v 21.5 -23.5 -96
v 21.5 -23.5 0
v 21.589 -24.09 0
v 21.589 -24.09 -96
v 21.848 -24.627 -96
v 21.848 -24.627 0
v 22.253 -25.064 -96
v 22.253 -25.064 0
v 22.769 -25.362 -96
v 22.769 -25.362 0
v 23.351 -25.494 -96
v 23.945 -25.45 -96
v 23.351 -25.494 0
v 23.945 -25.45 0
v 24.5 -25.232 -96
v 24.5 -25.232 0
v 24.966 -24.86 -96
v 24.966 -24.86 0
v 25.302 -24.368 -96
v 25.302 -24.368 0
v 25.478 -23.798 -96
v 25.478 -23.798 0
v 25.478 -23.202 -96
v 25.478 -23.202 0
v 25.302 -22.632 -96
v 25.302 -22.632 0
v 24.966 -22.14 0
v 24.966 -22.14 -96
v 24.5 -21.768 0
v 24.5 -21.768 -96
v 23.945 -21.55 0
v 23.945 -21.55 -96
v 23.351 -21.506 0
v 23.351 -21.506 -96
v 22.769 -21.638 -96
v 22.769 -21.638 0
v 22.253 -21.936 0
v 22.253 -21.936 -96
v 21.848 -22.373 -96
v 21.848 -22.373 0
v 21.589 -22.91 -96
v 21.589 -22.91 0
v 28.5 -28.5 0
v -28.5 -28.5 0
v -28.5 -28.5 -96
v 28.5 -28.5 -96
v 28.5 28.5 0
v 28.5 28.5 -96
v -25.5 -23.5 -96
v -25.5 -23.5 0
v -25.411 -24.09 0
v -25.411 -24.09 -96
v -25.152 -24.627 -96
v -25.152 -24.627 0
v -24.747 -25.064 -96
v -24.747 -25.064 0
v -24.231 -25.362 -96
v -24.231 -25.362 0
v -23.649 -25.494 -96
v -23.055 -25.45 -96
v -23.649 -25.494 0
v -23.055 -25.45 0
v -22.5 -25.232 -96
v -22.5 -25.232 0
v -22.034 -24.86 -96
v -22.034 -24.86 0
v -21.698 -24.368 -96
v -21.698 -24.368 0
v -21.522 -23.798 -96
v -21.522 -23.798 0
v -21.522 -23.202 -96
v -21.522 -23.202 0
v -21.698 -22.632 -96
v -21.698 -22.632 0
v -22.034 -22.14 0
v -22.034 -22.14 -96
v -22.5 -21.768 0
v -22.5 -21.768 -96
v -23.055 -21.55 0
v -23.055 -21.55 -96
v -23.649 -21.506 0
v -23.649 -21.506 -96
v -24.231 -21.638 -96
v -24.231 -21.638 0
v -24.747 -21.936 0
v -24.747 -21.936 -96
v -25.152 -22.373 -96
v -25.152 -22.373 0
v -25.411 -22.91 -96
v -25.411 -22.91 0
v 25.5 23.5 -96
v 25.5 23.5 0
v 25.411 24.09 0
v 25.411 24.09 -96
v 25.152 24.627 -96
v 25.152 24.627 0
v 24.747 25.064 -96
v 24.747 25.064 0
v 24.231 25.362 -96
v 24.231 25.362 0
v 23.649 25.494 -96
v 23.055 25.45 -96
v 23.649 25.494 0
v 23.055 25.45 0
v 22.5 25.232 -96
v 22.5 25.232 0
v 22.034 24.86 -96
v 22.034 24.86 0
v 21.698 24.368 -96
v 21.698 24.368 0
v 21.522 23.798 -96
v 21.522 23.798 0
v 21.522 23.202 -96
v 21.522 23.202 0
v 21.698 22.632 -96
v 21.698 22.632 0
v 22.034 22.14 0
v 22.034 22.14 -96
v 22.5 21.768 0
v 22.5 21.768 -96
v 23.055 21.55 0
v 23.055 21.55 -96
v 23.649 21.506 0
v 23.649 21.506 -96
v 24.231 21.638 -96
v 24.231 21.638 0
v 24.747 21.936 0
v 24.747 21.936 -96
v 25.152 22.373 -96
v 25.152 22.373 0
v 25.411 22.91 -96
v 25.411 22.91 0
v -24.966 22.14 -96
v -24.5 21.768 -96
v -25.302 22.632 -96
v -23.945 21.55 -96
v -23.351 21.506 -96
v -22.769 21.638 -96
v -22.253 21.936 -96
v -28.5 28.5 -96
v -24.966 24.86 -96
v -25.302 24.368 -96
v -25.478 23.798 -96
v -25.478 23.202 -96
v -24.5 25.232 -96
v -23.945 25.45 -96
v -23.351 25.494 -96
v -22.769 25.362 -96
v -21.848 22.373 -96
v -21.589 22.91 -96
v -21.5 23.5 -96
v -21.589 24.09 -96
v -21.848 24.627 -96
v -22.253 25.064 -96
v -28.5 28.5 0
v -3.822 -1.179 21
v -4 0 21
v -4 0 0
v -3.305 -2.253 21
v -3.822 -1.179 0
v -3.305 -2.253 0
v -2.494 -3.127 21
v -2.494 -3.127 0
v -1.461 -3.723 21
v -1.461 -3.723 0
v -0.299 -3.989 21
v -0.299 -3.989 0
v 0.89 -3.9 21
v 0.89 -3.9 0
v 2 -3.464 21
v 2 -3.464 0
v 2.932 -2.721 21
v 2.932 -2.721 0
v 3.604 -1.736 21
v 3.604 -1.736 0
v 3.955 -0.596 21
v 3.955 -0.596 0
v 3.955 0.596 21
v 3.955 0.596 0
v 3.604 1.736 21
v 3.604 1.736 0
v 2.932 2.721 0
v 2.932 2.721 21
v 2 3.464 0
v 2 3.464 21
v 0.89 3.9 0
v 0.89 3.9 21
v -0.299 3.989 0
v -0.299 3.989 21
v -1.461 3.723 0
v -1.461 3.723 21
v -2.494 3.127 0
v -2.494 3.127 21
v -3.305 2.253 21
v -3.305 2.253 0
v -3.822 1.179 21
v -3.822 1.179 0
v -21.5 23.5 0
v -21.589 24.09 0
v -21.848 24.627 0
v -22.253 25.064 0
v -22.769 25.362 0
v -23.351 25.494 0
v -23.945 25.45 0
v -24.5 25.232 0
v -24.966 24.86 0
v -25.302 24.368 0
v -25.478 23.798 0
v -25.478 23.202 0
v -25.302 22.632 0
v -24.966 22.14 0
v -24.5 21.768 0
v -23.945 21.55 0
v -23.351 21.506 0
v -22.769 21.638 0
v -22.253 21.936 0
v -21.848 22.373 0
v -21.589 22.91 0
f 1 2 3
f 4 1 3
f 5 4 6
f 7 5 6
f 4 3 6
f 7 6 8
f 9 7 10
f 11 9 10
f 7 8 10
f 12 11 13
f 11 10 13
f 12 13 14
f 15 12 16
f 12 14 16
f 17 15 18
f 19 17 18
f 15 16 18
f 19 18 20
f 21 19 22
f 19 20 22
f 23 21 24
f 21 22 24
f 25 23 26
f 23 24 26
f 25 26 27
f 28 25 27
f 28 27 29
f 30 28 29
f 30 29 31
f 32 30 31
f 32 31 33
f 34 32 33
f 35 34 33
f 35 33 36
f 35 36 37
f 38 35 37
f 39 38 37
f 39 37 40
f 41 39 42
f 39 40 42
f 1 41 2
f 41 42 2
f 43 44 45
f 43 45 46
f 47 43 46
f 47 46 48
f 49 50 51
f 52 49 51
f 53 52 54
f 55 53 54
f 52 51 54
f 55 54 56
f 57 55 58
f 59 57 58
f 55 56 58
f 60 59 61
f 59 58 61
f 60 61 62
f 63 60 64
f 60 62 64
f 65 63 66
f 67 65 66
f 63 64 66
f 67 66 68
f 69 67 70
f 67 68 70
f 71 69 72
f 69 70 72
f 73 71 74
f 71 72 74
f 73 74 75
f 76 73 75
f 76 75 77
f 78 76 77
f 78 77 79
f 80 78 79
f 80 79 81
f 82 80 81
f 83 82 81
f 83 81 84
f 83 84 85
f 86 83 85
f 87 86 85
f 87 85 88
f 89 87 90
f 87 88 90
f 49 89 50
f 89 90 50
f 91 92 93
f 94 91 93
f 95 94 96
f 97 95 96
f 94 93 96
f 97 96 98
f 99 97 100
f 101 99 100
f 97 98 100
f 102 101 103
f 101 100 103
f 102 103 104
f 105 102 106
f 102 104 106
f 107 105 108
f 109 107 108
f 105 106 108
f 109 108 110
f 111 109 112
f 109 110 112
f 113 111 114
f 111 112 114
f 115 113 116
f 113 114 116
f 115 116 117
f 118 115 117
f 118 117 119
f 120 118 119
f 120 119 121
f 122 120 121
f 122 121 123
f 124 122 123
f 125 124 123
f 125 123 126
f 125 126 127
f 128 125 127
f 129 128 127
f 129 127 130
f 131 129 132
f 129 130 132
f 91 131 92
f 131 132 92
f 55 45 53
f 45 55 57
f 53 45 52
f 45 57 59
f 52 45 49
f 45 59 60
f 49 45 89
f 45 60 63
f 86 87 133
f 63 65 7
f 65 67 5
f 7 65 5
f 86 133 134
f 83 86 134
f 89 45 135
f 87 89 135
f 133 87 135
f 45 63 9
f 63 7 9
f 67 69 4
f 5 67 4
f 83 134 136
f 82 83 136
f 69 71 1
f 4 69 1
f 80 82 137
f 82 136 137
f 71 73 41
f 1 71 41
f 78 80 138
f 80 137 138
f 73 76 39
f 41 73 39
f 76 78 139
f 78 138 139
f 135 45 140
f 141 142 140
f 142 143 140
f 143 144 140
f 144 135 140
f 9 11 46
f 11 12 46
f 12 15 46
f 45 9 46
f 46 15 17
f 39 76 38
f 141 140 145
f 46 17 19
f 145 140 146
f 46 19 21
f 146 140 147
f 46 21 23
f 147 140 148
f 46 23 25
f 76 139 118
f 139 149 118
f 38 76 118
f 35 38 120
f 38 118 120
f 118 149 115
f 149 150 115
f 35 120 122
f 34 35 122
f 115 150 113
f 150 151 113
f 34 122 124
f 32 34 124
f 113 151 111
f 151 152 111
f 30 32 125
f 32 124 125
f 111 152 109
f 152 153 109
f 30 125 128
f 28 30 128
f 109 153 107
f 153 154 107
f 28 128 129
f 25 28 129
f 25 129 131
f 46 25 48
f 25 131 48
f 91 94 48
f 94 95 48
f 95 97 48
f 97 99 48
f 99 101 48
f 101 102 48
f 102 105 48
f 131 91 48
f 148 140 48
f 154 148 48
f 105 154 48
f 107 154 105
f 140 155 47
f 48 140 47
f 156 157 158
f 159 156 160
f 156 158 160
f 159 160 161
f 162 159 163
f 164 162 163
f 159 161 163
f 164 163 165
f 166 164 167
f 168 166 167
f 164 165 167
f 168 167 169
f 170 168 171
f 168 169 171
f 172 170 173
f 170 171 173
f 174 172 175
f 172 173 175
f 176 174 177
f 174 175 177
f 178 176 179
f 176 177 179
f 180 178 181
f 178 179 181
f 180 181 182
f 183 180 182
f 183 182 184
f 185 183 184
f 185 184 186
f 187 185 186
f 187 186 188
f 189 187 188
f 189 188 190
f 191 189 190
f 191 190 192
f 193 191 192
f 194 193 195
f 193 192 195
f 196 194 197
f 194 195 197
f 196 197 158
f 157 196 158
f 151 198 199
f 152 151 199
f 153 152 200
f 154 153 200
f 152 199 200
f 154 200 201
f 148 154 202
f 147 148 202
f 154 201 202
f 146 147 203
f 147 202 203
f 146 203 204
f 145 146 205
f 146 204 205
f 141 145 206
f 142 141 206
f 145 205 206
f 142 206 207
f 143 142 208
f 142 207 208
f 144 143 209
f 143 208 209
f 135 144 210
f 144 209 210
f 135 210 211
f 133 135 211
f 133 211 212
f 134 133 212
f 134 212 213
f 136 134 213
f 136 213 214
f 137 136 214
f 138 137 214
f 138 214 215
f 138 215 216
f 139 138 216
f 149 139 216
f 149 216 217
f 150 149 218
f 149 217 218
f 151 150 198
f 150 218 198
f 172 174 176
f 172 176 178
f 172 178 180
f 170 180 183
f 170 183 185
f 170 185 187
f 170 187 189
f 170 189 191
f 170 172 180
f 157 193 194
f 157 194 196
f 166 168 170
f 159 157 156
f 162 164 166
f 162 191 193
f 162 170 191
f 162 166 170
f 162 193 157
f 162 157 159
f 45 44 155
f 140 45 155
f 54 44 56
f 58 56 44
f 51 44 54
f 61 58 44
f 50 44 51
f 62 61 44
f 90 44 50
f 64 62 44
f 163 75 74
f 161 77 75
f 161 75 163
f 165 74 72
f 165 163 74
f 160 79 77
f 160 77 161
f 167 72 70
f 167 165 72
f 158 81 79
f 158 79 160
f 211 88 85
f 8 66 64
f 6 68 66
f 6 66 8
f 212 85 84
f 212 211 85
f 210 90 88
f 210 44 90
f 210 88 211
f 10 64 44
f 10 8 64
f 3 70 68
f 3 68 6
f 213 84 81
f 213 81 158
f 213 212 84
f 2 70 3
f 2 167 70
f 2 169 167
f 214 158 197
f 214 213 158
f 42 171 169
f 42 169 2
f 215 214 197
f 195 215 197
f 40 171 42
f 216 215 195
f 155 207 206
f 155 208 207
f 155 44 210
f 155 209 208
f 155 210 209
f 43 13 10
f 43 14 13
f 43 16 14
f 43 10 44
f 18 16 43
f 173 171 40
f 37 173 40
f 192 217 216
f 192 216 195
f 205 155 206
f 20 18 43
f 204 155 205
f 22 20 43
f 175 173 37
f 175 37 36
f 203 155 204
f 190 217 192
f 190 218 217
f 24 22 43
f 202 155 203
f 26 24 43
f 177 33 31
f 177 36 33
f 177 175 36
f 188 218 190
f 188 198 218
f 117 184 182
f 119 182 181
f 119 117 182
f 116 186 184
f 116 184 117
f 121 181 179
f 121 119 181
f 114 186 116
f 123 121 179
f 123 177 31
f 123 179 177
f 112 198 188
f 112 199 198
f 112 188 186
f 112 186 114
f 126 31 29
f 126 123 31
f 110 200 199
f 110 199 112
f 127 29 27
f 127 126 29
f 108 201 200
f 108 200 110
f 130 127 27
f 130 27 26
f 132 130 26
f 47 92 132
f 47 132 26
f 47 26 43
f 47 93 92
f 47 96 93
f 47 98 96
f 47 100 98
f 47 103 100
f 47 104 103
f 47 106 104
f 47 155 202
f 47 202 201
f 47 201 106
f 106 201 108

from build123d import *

# Parameters (mm, degrees)
SKETCH_1_W      = 57
SKETCH_1_H      = 57
SKETCH_1_R      = 2
EXTRUDE_1_DEPTH = 96
SKETCH_2_R      = 4
EXTRUDE_2_DEPTH = 21


with BuildPart() as part:
    # 草圖1 → 填料-伸長1 (new body)
    with BuildSketch(Plane.XY):
        Rectangle(SKETCH_1_W, SKETCH_1_H)
        with Locations((-23.5, 23.5)):
            Circle(SKETCH_1_R, mode=Mode.SUBTRACT)
        with Locations((23.5, 23.5)):
            Circle(SKETCH_1_R, mode=Mode.SUBTRACT)
        with Locations(Location((23.5, -23.5, 0), (0, 0, 180))):
            Circle(SKETCH_1_R, mode=Mode.SUBTRACT)
        with Locations(Location((-23.5, -23.5, 0), (0, 0, 180))):
            Circle(SKETCH_1_R, mode=Mode.SUBTRACT)
    extrude(amount=-EXTRUDE_1_DEPTH)

    # 草圖2 → 填料-伸長2 (add)
    with BuildSketch(Plane.XY):
        with Locations(Location((0, 0, 0), (0, 0, 180))):
            Circle(SKETCH_2_R)
    extrude(amount=EXTRUDE_2_DEPTH)


solid = part.part
